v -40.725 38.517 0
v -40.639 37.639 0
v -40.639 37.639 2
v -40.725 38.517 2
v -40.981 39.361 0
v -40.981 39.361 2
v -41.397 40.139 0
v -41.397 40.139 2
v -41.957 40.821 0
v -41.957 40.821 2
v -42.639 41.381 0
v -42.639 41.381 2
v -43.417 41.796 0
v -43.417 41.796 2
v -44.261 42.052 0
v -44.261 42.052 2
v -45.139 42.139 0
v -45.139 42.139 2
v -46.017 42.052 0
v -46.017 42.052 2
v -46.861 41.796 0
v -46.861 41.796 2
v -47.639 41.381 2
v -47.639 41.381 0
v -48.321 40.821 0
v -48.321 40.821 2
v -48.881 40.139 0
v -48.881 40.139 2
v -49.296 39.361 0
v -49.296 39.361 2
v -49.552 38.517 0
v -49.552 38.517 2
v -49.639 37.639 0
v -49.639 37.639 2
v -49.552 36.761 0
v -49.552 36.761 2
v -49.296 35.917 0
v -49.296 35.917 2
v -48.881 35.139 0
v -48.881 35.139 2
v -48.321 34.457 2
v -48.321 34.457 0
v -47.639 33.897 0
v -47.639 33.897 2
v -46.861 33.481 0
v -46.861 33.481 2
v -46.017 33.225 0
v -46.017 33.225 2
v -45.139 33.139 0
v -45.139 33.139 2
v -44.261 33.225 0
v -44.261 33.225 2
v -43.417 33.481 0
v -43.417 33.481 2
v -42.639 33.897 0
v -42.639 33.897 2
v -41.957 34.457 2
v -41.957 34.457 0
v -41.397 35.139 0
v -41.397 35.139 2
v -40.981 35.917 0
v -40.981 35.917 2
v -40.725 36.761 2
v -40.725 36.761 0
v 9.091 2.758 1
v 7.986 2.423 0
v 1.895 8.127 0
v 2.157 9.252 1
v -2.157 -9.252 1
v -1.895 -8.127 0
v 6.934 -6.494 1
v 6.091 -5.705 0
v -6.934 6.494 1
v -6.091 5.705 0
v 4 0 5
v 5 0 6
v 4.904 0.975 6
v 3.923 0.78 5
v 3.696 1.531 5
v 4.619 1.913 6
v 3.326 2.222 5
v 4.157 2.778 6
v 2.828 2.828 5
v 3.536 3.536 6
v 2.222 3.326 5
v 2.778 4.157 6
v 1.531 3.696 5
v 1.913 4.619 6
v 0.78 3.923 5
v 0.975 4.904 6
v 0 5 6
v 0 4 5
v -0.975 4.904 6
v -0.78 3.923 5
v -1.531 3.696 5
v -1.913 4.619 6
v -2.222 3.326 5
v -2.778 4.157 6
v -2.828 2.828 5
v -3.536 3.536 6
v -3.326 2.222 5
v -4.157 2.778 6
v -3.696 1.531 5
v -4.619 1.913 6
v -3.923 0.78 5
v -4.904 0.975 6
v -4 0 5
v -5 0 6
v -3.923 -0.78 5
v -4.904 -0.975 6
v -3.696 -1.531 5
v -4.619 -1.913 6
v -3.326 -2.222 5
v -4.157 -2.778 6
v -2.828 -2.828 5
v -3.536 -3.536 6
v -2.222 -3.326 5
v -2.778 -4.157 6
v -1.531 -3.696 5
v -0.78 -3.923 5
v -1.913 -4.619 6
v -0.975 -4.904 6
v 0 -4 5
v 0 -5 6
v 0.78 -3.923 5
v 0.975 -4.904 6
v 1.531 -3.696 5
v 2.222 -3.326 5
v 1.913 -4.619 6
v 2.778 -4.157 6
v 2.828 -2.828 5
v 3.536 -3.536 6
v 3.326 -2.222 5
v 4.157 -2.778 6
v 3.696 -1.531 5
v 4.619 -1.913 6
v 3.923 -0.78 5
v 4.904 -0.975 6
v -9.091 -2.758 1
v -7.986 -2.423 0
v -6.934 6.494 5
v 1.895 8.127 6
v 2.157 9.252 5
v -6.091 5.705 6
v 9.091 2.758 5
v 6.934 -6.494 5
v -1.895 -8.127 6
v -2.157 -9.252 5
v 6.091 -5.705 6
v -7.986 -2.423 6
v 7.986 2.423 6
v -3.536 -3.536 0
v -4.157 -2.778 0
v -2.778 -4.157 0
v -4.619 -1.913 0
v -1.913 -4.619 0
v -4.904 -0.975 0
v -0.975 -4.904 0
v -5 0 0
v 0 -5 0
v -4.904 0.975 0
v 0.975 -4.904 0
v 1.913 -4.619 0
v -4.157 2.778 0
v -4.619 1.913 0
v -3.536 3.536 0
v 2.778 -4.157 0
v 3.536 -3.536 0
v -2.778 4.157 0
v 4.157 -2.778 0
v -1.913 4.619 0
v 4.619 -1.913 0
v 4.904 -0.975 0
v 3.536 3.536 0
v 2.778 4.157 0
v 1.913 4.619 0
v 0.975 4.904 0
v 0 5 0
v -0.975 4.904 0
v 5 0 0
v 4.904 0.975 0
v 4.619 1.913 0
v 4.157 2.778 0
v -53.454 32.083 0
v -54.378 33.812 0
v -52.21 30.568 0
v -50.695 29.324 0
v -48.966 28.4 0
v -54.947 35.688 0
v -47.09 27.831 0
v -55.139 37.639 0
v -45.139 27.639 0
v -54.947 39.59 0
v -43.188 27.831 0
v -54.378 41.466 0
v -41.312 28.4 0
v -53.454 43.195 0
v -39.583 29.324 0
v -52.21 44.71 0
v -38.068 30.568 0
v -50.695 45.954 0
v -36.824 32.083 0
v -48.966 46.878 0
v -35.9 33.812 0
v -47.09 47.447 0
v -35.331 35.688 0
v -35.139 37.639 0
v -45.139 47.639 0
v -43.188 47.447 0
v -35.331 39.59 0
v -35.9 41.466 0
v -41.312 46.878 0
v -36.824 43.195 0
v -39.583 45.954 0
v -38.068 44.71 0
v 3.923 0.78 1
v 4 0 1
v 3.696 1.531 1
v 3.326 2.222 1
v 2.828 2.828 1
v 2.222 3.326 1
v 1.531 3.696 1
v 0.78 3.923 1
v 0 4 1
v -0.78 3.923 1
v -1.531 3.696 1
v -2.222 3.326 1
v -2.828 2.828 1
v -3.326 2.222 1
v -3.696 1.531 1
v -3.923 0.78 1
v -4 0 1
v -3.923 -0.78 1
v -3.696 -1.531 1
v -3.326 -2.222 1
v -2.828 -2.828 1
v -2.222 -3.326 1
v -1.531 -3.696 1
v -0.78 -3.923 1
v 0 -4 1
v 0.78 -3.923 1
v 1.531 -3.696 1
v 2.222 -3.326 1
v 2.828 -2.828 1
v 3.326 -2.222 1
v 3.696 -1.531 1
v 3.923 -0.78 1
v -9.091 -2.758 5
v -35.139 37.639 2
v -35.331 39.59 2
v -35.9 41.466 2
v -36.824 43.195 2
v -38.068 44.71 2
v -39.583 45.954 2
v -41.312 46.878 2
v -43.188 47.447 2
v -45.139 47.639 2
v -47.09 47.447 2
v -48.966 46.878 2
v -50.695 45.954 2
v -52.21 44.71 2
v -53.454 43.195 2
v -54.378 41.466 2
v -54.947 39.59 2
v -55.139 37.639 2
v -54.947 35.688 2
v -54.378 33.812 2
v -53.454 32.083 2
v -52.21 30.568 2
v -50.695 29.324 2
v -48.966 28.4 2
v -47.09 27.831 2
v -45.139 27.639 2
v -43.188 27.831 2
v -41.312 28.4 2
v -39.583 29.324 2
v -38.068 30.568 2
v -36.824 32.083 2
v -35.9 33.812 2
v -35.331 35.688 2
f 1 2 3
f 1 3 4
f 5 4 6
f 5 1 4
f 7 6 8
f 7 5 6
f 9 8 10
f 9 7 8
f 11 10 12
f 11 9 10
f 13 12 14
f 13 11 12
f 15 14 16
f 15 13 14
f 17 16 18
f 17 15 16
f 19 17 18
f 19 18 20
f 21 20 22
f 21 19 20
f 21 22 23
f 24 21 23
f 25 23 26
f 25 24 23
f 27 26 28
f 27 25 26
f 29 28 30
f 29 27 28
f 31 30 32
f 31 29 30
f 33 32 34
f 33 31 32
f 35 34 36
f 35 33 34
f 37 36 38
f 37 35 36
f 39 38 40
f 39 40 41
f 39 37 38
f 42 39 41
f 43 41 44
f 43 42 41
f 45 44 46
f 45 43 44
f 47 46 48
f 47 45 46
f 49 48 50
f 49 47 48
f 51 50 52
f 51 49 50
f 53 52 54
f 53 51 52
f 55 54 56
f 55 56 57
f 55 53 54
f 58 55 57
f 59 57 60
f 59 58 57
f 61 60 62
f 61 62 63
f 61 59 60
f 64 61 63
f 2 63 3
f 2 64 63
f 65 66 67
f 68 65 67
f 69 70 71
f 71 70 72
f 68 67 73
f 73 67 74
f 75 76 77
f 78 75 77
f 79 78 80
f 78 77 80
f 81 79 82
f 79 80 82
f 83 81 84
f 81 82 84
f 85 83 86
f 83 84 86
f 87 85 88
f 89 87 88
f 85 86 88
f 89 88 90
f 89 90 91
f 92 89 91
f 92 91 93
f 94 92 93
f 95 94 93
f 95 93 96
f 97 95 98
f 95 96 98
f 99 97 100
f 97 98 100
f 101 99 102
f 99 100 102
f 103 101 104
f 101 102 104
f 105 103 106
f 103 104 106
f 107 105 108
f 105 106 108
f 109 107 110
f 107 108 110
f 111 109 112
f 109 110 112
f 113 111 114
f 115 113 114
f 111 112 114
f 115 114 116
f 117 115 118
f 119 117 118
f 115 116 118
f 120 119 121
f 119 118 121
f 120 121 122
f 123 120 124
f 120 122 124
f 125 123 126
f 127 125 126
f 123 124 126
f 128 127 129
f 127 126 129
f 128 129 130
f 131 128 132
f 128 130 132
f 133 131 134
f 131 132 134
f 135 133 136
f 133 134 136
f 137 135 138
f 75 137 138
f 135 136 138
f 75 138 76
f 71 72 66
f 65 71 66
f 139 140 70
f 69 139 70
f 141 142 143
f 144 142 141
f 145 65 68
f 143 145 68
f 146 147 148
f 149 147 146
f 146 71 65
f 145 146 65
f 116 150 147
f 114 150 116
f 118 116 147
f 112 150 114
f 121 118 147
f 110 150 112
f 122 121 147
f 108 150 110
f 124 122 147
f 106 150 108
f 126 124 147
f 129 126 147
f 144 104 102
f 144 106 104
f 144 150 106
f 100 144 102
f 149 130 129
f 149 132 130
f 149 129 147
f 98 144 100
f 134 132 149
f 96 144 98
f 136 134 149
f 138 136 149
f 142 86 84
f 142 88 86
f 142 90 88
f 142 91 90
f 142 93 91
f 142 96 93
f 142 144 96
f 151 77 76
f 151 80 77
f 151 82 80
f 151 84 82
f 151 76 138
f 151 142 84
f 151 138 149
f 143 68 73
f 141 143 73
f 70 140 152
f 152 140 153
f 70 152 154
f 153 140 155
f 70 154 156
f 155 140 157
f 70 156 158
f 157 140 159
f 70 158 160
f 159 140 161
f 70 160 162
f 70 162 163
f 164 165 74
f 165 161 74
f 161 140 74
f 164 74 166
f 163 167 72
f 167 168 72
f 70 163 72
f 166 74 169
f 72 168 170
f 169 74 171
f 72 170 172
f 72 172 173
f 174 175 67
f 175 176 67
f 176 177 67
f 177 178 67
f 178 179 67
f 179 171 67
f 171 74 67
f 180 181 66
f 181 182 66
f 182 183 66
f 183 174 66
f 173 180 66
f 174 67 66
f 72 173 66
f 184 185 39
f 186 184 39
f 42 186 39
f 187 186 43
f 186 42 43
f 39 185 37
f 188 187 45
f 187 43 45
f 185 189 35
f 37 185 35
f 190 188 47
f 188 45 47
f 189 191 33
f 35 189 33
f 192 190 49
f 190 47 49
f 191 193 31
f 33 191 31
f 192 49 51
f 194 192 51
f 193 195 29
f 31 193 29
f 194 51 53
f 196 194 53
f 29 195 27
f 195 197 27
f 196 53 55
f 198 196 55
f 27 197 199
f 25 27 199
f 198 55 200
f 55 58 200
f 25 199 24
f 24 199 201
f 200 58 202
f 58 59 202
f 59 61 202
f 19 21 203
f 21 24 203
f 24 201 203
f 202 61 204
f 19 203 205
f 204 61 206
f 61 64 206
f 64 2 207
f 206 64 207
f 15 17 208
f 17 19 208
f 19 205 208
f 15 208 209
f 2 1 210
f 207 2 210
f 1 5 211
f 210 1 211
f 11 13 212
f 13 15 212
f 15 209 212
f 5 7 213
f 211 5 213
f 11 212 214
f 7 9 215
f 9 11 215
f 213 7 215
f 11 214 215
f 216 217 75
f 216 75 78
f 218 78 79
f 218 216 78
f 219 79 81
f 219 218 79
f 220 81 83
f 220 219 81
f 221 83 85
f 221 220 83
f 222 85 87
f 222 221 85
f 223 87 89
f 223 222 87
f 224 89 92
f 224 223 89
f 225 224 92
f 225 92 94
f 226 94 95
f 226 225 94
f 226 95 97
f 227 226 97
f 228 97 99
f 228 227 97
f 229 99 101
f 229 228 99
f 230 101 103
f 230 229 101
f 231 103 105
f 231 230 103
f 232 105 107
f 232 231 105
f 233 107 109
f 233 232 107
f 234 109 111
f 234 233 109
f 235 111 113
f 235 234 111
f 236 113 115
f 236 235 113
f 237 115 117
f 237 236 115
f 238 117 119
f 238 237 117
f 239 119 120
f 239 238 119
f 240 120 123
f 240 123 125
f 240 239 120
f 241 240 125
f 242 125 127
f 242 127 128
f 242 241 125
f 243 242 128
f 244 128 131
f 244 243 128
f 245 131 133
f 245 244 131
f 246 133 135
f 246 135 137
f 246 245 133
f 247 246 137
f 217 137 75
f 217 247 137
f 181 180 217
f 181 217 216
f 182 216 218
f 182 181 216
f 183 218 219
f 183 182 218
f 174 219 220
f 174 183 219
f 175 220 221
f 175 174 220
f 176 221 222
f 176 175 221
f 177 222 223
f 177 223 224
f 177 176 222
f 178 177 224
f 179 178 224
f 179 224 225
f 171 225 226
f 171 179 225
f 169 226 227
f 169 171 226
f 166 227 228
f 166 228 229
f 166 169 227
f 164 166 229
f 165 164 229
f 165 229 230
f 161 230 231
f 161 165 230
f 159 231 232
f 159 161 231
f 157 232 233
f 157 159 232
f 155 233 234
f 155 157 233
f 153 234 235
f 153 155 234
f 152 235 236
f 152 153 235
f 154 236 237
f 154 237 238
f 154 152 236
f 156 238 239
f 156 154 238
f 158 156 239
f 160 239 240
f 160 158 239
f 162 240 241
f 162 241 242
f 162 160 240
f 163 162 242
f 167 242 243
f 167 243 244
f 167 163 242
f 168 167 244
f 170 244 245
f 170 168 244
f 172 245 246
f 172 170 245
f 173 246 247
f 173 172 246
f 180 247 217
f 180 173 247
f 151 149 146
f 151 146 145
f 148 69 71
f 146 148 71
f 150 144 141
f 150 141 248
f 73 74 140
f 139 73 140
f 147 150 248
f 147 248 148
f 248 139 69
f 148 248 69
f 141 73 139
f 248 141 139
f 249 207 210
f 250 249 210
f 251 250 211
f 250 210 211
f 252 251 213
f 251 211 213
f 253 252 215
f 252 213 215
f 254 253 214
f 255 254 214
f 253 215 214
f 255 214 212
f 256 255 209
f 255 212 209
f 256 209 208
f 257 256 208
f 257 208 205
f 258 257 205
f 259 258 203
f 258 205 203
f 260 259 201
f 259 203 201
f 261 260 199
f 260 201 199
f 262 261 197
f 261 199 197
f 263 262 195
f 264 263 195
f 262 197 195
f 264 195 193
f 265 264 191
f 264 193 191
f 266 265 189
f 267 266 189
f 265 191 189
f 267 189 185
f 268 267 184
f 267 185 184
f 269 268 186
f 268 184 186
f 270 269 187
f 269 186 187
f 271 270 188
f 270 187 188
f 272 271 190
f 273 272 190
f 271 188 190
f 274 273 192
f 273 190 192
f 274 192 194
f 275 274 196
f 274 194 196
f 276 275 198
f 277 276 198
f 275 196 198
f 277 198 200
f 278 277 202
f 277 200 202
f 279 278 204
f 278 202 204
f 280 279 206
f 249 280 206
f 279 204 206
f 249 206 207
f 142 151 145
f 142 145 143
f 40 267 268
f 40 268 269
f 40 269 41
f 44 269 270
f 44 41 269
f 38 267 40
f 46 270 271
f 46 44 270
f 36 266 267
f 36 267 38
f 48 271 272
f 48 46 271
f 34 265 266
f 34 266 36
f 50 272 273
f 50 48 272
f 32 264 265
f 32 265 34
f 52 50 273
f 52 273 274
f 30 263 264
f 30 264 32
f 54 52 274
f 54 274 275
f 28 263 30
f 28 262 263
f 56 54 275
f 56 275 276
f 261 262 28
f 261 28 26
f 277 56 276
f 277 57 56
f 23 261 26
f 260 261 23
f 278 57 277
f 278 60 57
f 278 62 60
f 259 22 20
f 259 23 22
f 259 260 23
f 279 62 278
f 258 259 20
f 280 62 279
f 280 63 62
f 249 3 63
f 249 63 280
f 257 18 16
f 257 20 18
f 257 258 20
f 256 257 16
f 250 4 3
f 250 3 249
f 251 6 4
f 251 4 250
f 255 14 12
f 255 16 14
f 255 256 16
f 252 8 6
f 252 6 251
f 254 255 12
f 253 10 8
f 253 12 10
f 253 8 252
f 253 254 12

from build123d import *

# Parameters (mm, degrees)
F0_R     = 4
F1_DEPTH = 6
F2_SIZE  = 1
F3_R     = 10
F3_R_2   = 4.5
F4_DEPTH = 2


with BuildPart() as f1:
    # F0 (on Top) → F1 (new body)
    with BuildSketch(Plane.XY):
        Polygon((6.933852, -6.493973), (9.090872, 2.757906), (2.15702, 9.251879), (-6.933852, 6.493973), (-9.090872, -2.757906), (-2.15702, -9.251879), align=None)
        Circle(F0_R, mode=Mode.SUBTRACT)
    extrude(amount=F1_DEPTH)

    # F2
    f2_edges = [f1.edges().sort_by_distance(p)[0] for p in [
        (-8.012362, 1.868034, 6),
        (-5.623946, -6.004892, 6),
        (2.388416, -7.872926, 6),
        (8.012362, -1.868034, 6),
        (5.623946, 6.004892, 6),
        (-2.388416, 7.872926, 6),
        (2.388416, -7.872926, 0),
        (8.012362, -1.868034, 0),
        (5.623946, 6.004892, 0),
        (-2.388416, 7.872926, 0),
        (-8.012362, 1.868034, 0),
        (-5.623946, -6.004892, 0),
        (-4, 0, 0),
        (4, 0, 3),
        (-4, 0, 6),
    ]]
    chamfer(f2_edges, length=F2_SIZE)


with BuildPart() as f4:
    # F3 (on Top) → F4 (new body)
    with BuildSketch(Plane.XY):
        with Locations((-45.138892, 37.638888)):
            Circle(F3_R)
        with Locations((-45.138892, 37.638888)):
            Circle(F3_R_2, mode=Mode.SUBTRACT)
    extrude(amount=F4_DEPTH)


solid = Compound([f1.part, f4.part])
